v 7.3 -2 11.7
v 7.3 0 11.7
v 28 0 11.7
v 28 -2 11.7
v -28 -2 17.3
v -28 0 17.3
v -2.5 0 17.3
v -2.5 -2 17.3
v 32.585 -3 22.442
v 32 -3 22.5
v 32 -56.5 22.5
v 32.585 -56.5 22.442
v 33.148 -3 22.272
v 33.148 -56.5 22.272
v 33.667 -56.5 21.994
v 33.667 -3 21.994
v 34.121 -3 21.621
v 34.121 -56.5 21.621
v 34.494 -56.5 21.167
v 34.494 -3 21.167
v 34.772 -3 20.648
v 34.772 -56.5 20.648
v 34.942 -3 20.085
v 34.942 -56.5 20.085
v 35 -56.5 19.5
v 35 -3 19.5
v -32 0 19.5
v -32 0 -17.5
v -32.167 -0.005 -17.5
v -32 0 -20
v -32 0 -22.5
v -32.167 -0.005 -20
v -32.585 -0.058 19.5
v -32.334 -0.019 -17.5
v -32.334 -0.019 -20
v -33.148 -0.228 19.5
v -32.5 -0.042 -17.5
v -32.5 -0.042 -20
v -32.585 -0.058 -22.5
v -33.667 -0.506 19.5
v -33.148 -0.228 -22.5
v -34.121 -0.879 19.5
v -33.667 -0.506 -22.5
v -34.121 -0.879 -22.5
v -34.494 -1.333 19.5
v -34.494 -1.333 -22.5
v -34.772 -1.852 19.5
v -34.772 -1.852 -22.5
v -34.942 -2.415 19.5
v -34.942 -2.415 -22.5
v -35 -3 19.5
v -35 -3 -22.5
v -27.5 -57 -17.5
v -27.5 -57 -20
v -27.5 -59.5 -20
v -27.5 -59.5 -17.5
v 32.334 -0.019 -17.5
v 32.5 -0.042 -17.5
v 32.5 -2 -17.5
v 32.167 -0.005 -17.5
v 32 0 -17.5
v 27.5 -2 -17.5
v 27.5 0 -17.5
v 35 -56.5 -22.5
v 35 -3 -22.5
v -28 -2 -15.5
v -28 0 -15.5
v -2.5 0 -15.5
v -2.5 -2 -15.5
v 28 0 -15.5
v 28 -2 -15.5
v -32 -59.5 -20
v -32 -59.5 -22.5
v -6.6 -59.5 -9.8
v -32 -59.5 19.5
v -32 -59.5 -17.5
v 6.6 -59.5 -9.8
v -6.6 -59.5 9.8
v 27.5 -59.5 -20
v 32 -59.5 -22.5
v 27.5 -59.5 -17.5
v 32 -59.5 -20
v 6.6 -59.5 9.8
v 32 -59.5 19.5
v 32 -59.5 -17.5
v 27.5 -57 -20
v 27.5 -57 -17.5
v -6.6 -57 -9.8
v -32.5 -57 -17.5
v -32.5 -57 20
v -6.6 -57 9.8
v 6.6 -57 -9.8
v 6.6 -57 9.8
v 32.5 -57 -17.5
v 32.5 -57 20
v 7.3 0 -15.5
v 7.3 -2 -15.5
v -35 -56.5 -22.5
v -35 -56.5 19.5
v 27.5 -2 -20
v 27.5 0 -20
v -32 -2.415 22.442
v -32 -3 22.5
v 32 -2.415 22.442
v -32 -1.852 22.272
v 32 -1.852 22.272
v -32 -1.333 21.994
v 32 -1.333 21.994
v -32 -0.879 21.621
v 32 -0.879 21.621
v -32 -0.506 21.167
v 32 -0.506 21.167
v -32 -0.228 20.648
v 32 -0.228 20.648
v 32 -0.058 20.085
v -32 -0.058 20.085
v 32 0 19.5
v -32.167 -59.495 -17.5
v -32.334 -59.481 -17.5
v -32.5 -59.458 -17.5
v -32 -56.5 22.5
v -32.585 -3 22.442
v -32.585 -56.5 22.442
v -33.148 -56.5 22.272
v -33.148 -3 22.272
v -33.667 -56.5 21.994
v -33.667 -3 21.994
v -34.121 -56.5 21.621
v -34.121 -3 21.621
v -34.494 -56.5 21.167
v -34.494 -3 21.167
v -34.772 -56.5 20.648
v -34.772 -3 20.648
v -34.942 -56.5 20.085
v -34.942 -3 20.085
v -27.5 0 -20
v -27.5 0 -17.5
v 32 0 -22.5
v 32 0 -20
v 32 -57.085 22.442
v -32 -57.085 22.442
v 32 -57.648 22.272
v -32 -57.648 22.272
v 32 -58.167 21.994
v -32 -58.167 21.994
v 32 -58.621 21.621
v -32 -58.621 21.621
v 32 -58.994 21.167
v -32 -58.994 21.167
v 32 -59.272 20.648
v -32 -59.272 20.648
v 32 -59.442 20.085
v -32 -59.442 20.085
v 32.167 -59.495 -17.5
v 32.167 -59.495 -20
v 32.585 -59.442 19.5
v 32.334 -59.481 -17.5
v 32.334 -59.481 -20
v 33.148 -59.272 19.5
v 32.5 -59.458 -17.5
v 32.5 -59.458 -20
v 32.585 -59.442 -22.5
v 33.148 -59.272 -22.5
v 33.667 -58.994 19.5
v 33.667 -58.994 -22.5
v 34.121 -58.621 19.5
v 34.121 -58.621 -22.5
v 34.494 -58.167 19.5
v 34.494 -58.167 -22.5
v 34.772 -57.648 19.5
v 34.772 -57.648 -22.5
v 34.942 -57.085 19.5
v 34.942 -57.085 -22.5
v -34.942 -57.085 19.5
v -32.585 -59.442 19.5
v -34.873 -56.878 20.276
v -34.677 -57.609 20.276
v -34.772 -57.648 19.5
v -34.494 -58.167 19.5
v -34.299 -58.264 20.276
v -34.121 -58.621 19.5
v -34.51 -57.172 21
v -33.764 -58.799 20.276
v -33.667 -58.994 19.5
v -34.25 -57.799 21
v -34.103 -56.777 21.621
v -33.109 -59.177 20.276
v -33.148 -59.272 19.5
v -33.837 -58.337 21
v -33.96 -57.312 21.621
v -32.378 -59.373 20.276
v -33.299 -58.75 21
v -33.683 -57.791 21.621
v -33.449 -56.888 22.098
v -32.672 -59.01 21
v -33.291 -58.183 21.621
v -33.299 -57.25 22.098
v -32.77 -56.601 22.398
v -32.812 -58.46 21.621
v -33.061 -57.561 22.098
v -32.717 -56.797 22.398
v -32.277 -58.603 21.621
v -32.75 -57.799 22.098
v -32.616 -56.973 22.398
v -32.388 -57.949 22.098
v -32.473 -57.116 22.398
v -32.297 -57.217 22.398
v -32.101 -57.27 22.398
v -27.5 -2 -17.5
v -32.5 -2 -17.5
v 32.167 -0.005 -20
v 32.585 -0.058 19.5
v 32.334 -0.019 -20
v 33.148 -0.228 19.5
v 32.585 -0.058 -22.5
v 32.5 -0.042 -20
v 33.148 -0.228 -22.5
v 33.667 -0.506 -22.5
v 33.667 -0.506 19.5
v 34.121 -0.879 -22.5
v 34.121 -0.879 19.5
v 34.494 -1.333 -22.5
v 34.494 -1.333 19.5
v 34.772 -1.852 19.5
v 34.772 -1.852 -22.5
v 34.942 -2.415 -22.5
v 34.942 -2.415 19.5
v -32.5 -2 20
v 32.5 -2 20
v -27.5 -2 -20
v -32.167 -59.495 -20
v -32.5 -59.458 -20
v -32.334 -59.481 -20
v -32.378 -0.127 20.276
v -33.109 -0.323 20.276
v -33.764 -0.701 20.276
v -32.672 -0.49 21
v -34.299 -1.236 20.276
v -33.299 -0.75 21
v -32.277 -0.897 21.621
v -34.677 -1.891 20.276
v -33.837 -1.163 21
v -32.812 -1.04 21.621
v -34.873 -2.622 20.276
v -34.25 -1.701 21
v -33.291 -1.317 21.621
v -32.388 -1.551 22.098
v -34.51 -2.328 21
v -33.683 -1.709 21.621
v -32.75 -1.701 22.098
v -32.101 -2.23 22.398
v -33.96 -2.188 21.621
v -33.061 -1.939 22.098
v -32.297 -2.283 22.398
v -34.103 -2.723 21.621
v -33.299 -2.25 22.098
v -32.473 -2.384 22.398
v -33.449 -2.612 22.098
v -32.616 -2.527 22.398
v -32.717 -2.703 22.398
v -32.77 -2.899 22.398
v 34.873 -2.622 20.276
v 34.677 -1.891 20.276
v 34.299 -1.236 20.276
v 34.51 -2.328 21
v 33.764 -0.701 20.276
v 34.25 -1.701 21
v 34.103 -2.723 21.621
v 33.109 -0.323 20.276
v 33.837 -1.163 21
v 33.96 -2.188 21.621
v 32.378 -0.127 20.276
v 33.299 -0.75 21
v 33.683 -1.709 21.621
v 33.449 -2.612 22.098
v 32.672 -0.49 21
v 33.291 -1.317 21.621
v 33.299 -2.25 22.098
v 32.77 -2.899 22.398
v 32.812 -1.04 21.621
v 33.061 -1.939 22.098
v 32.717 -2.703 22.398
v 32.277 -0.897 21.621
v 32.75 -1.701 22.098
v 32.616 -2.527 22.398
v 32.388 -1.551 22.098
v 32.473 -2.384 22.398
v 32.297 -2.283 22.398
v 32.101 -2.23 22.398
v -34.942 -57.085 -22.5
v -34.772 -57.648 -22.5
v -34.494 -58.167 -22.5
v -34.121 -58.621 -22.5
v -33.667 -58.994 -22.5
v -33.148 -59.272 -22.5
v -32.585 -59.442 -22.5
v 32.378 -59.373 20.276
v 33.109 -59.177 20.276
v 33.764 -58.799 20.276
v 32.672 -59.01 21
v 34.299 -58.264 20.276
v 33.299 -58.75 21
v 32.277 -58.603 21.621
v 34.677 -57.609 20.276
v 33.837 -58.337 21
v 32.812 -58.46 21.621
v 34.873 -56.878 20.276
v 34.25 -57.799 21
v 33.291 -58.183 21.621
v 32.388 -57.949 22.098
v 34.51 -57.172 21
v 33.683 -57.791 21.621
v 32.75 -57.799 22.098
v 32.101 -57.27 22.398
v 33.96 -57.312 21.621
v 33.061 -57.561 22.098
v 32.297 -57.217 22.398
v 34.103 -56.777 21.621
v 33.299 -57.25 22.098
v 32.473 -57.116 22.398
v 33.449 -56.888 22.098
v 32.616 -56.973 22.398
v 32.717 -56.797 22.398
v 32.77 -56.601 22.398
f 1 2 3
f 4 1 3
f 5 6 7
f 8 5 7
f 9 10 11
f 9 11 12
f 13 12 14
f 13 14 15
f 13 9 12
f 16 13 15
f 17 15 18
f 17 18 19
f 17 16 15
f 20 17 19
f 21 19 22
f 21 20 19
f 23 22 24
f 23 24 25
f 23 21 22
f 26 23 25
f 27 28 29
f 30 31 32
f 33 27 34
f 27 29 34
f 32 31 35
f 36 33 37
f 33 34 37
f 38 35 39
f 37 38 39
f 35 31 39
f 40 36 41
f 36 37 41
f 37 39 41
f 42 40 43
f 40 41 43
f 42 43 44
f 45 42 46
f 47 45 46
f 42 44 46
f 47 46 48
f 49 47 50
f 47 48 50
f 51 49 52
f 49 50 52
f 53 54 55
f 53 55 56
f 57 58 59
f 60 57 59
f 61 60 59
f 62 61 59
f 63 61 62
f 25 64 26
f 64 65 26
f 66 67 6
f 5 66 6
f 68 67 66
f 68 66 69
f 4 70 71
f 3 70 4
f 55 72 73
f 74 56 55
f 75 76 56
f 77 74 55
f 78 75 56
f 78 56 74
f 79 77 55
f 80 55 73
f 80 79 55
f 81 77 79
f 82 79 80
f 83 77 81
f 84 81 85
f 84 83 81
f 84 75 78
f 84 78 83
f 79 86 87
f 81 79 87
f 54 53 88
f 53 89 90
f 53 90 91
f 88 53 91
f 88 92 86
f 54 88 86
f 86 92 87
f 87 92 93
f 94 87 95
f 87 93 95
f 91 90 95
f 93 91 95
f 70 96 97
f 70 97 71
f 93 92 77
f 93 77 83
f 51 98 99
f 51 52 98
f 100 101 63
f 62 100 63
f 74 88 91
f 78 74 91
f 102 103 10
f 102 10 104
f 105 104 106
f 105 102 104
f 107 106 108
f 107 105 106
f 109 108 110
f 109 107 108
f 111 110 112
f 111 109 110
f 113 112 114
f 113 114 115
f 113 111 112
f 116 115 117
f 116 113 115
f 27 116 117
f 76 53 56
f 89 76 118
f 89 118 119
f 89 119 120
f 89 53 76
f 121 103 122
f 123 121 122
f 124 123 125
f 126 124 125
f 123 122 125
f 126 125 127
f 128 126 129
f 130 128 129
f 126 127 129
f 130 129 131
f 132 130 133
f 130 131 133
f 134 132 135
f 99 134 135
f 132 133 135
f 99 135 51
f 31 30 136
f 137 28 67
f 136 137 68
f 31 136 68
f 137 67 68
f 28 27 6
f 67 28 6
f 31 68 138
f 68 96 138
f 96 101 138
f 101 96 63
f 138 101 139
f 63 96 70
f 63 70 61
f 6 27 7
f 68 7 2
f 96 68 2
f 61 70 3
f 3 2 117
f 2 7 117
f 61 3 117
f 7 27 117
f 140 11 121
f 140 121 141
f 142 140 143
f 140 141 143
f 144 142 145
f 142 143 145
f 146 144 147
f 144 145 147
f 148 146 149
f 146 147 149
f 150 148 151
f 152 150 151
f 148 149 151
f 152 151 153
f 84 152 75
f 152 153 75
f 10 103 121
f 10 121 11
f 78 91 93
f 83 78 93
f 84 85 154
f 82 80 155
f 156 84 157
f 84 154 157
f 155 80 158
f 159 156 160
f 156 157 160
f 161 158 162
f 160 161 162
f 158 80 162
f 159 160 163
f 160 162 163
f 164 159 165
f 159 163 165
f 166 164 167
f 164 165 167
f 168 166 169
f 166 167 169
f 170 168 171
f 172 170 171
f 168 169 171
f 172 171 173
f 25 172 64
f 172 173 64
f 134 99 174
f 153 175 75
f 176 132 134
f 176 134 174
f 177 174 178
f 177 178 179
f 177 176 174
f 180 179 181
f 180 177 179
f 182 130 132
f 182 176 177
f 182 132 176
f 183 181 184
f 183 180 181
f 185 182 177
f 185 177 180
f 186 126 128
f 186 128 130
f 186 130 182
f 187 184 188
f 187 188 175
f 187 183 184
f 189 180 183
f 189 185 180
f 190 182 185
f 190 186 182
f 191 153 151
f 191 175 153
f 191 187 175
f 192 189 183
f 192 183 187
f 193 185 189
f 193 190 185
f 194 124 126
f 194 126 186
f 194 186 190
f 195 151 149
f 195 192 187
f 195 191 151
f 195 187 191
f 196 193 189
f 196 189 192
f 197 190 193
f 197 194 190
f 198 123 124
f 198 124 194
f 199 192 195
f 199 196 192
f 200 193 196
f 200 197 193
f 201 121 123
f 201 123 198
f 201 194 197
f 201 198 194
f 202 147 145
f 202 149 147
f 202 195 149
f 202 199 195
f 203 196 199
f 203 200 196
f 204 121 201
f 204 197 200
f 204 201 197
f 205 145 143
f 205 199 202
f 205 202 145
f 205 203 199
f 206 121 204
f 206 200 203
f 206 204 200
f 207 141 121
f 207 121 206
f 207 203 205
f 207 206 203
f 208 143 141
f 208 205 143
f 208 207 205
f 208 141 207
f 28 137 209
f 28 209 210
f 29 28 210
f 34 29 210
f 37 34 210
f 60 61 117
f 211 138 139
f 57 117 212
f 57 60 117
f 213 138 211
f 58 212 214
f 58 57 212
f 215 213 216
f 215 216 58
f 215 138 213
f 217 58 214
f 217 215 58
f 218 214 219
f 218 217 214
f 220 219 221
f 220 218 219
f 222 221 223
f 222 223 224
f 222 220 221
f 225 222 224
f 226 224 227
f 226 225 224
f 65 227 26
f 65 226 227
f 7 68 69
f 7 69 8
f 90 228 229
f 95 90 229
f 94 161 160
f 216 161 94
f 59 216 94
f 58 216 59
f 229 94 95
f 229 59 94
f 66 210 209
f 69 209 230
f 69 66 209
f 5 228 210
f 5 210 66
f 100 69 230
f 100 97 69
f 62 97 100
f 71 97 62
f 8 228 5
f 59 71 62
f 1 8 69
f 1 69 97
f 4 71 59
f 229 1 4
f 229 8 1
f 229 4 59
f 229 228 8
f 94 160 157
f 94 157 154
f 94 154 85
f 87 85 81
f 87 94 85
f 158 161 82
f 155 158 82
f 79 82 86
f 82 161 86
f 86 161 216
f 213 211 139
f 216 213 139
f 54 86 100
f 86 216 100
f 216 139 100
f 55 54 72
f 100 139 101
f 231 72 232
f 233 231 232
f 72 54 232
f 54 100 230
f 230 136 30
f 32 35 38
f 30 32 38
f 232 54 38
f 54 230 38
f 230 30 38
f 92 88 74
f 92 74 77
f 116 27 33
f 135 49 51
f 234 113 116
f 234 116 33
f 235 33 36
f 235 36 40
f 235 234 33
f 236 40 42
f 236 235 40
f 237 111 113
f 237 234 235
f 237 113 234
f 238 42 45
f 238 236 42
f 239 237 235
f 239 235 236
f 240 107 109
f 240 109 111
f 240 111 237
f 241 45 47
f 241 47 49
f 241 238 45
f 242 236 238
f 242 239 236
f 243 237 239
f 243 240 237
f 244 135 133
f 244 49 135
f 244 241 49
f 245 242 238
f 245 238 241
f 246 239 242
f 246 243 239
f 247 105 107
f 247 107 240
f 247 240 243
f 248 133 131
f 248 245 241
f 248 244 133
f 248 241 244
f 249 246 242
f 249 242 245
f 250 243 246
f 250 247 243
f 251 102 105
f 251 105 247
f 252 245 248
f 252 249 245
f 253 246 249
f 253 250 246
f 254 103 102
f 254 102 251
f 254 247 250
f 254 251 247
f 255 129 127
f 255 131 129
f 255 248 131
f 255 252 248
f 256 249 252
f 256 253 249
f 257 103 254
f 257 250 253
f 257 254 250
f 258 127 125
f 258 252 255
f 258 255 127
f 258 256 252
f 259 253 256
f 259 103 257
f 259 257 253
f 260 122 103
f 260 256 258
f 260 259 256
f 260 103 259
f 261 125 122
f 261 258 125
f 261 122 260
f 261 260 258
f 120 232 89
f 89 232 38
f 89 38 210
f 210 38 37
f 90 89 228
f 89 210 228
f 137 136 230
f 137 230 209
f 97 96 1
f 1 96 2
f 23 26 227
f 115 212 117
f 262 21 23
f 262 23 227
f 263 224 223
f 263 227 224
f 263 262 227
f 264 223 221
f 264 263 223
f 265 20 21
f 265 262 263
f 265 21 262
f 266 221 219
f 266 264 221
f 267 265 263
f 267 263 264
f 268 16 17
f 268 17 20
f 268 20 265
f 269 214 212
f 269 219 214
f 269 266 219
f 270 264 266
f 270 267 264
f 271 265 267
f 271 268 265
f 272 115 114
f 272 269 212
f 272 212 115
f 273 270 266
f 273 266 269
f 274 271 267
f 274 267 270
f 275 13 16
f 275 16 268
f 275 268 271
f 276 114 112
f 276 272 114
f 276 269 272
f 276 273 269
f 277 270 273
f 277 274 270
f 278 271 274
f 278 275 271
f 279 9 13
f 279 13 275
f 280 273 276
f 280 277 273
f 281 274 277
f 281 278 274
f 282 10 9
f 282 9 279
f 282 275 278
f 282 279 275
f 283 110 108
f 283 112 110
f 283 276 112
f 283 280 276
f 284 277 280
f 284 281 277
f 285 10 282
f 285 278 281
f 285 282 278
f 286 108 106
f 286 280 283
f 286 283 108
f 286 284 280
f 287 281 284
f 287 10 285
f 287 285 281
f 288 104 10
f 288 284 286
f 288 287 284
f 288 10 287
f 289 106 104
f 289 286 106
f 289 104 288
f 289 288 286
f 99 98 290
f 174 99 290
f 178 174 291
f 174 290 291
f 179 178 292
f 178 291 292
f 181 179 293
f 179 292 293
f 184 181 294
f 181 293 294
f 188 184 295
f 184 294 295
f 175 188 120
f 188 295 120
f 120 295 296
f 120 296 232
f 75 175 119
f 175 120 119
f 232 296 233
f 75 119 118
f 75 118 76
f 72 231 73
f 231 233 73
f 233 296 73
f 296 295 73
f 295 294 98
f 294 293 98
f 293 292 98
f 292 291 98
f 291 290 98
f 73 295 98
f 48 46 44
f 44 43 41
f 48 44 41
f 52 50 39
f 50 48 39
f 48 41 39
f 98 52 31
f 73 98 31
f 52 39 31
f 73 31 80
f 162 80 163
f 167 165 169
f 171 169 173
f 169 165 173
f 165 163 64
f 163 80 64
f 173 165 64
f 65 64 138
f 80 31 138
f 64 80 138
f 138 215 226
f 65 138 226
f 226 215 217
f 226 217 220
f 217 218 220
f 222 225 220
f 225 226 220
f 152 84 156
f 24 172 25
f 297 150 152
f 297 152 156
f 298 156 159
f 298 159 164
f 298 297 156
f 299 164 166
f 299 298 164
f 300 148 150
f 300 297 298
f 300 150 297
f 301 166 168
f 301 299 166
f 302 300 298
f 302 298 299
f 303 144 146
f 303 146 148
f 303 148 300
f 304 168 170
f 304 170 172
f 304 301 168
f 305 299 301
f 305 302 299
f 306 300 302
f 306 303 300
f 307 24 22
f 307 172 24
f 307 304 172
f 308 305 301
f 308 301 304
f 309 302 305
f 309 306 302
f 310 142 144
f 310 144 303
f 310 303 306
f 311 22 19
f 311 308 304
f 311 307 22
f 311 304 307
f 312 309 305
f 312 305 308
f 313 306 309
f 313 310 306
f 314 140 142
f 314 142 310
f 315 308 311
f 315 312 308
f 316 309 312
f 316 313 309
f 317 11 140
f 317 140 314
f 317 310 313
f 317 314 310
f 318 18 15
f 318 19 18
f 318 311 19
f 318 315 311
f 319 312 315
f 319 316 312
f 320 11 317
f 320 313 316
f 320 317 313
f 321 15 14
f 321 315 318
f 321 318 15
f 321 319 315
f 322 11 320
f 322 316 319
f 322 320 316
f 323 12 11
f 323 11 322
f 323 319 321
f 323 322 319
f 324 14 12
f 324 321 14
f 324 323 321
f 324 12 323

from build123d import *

# Parameters (mm, degrees)
F0_W         = 70
F0_H         = 45
F0_W_2       = 20.7
F0_H_2       = 27.2
F0_W_3       = 25.5
F0_H_3       = 32.8
F1_DEPTH     = 2
F2_W         = 70
F2_H         = 45
F2_W_2       = 65
F2_H_2       = 40
F3_DEPTH     = 55
F4_W         = 70
F4_H         = 45
F4_W_2       = 13.2
F4_H_2       = 19.6
F5_DEPTH     = 2.5
F6_W         = 5
F6_H         = 2.5
F7_DEPTH     = 59.501
F8_T1_DEPTH  = 64
F8_T3_DEPTH  = 49.5
F8_T5_DEPTH  = 53.5
F8_S9_W      = 3
F8_S9_H      = 3
F8_T10_DEPTH = 3
F8_S15_W     = 3
F8_S15_H     = 3
F8_T16_DEPTH = 3
F8_S21_W     = 3
F8_S21_H     = 3
F8_T22_DEPTH = 3
F8_S27_W     = 3
F8_S27_H     = 3
F8_T28_DEPTH = 3


# Not quite as in the source:
# - a fillet or chamfer that OpenCascade refuses, or shapes differently, is made with other operations: its cross-section is extruded or revolved along the edge and cut away or added


with BuildPart() as f1:
    # F0 (on Front) → F1 (new body)
    with BuildSketch(Plane.XZ):
        Rectangle(F0_W, F0_H)
        with Locations((17.65, -1.9)):
            Rectangle(F0_W_2, F0_H_2, mode=Mode.SUBTRACT)
        with Locations((-15.25, 0.9)):
            Rectangle(F0_W_3, F0_H_3, mode=Mode.SUBTRACT)
    extrude(amount=F1_DEPTH)

    # F2 (on face) → F3 (join)
    with BuildSketch(Plane.XZ.offset(2)):
        Rectangle(F2_W, F2_H)
        Rectangle(F2_W_2, F2_H_2, mode=Mode.SUBTRACT)
    extrude(amount=F3_DEPTH)

    # F4 (on face) → F5 (join)
    with BuildSketch(Plane.XZ.offset(57)):
        Rectangle(F4_W, F4_H)
        Rectangle(F4_W_2, F4_H_2, mode=Mode.SUBTRACT)
    extrude(amount=F5_DEPTH)

    # F6 (on face) → F7 (cut, through all)
    with BuildSketch(Plane(origin=(0, 0, 0), x_dir=(-1, 0, 0), z_dir=(0, 1, 0))):
        with Locations((-30, -18.75)):
            Rectangle(F6_W, F6_H)
        with Locations((30, -18.75)):
            Rectangle(F6_W, F6_H)
    extrude(amount=-F7_DEPTH, mode=Mode.SUBTRACT)

    # F8: fillet of radius 3 on 8 edges, made by hand

    # F8_s2 → F8_t1 (cut)
    with BuildSketch(Plane.YZ.offset(-32)):
        with BuildLine():
            ThreePointArc((-56.5, 22.5), (-58.6213203436, 21.6213203436), (-59.5, 19.5))
            Line((-59.5, 19.5), (-59.5, 22.5))
            Line((-59.5, 22.5), (-56.5, 22.5))
        make_face()
        with BuildLine():
            ThreePointArc((-3, 22.5), (-0.8786796564, 21.6213203436), (0, 19.5))
            Line((0, 19.5), (0, 22.5))
            Line((0, 22.5), (-3, 22.5))
        make_face()
    extrude(amount=F8_T1_DEPTH, mode=Mode.SUBTRACT)

    # F8_s4 → F8_t3 (cut)
    with BuildSketch(Plane.XY.offset(-30)):
        with BuildLine():
            ThreePointArc((32, -59.5), (34.1213203436, -58.6213203436), (35, -56.5))
            Line((35, -56.5), (35, -59.5))
            Line((35, -59.5), (32, -59.5))
        make_face()
        with BuildLine():
            ThreePointArc((-35, -56.5), (-34.1213203436, -58.6213203436), (-32, -59.5))
            Line((-32, -59.5), (-35, -59.5))
            Line((-35, -59.5), (-35, -56.5))
        make_face()
        with BuildLine():
            ThreePointArc((32, 0), (34.1213203436, -0.8786796564), (35, -3))
            Line((35, -3), (35, 0))
            Line((35, 0), (32, 0))
        make_face()
        with BuildLine():
            ThreePointArc((-32, 0), (-34.1213203436, -0.8786796564), (-35, -3))
            Line((-35, -3), (-35, 0))
            Line((-35, 0), (-32, 0))
        make_face()
    extrude(amount=F8_T3_DEPTH, mode=Mode.SUBTRACT)

    # F8_s6 → F8_t5 (cut)
    with BuildSketch(Plane.XZ.offset(3)):
        with BuildLine():
            ThreePointArc((32, 22.5), (34.1213203436, 21.6213203436), (35, 19.5))
            Line((35, 19.5), (35, 22.5))
            Line((35, 22.5), (32, 22.5))
        make_face()
        with BuildLine():
            ThreePointArc((-32, 22.5), (-34.1213203436, 21.6213203436), (-35, 19.5))
            Line((-35, 19.5), (-35, 22.5))
            Line((-35, 22.5), (-32, 22.5))
        make_face()
    extrude(amount=F8_T5_DEPTH, mode=Mode.SUBTRACT)


with BuildPart() as f8_tool8:
    # F8_s9 → F8_t10 (new body)
    with BuildSketch(Plane.XY.offset(19.5)):
        with Locations((33.5, -58)):
            Rectangle(F8_S9_W, F8_S9_H)
    extrude(amount=F8_T10_DEPTH)

    # F8_s11 → F8_t12 (revolve, cut)
    with BuildSketch(Plane(origin=(32, -56.5, 19.5), x_dir=(-0.7071067812, 0.7071067812, 0), z_dir=(0.7071067812, 0.7071067812, 0))):
        with BuildLine():
            ThreePointArc((0, -3), (3, 0), (0, 3))
            Line((0, 3), (0, -3))
        make_face()
    revolve(axis=Axis((32, -56.5, 19.5), (0, 0, 1)), mode=Mode.SUBTRACT)


with BuildPart() as f1_1:
    add(f1.part)

    # F8_t7: cut F8_tool8
    add(f8_tool8.part, mode=Mode.SUBTRACT)


with BuildPart() as f8_tool14:
    # F8_s15 → F8_t16 (new body)
    with BuildSketch(Plane.XY.offset(19.5)):
        with Locations((-33.5, -58)):
            Rectangle(F8_S15_W, F8_S15_H)
    extrude(amount=F8_T16_DEPTH)

    # F8_s17 → F8_t18 (revolve, cut)
    with BuildSketch(Plane(origin=(-32, -56.5, 19.5), x_dir=(0.7071067812, 0.7071067812, 0), z_dir=(0.7071067812, -0.7071067812, 0))):
        with BuildLine():
            ThreePointArc((0, -3), (3, 0), (0, 3))
            Line((0, 3), (0, -3))
        make_face()
    revolve(axis=Axis((-32, -56.5, 19.5), (0, 0, 1)), mode=Mode.SUBTRACT)


with BuildPart() as f1_2:
    add(f1_1.part)

    # F8_t13: cut F8_tool14
    add(f8_tool14.part, mode=Mode.SUBTRACT)


with BuildPart() as f8_tool20:
    # F8_s21 → F8_t22 (new body)
    with BuildSketch(Plane.XY.offset(19.5)):
        with Locations((33.5, -1.5)):
            Rectangle(F8_S21_W, F8_S21_H)
    extrude(amount=F8_T22_DEPTH)

    # F8_s23 → F8_t24 (revolve, cut)
    with BuildSketch(Plane(origin=(32, -3, 19.5), x_dir=(-0.7071067812, -0.7071067812, 0), z_dir=(-0.7071067812, 0.7071067812, 0))):
        with BuildLine():
            ThreePointArc((0, -3), (3, 0), (0, 3))
            Line((0, 3), (0, -3))
        make_face()
    revolve(axis=Axis((32, -3, 19.5), (0, 0, 1)), mode=Mode.SUBTRACT)


with BuildPart() as f1_3:
    add(f1_2.part)

    # F8_t19: cut F8_tool20
    add(f8_tool20.part, mode=Mode.SUBTRACT)


with BuildPart() as f8_tool26:
    # F8_s27 → F8_t28 (new body)
    with BuildSketch(Plane.XY.offset(19.5)):
        with Locations((-33.5, -1.5)):
            Rectangle(F8_S27_W, F8_S27_H)
    extrude(amount=F8_T28_DEPTH)

    # F8_s29 → F8_t30 (revolve, cut)
    with BuildSketch(Plane(origin=(-32, -3, 19.5), x_dir=(0.7071067812, -0.7071067812, 0), z_dir=(-0.7071067812, -0.7071067812, 0))):
        with BuildLine():
            ThreePointArc((0, -3), (3, 0), (0, 3))
            Line((0, 3), (0, -3))
        make_face()
    revolve(axis=Axis((-32, -3, 19.5), (0, 0, 1)), mode=Mode.SUBTRACT)


with BuildPart() as f1_4:
    add(f1_3.part)

    # F8_t25: cut F8_tool26
    add(f8_tool26.part, mode=Mode.SUBTRACT)


solid = f1_4.part
